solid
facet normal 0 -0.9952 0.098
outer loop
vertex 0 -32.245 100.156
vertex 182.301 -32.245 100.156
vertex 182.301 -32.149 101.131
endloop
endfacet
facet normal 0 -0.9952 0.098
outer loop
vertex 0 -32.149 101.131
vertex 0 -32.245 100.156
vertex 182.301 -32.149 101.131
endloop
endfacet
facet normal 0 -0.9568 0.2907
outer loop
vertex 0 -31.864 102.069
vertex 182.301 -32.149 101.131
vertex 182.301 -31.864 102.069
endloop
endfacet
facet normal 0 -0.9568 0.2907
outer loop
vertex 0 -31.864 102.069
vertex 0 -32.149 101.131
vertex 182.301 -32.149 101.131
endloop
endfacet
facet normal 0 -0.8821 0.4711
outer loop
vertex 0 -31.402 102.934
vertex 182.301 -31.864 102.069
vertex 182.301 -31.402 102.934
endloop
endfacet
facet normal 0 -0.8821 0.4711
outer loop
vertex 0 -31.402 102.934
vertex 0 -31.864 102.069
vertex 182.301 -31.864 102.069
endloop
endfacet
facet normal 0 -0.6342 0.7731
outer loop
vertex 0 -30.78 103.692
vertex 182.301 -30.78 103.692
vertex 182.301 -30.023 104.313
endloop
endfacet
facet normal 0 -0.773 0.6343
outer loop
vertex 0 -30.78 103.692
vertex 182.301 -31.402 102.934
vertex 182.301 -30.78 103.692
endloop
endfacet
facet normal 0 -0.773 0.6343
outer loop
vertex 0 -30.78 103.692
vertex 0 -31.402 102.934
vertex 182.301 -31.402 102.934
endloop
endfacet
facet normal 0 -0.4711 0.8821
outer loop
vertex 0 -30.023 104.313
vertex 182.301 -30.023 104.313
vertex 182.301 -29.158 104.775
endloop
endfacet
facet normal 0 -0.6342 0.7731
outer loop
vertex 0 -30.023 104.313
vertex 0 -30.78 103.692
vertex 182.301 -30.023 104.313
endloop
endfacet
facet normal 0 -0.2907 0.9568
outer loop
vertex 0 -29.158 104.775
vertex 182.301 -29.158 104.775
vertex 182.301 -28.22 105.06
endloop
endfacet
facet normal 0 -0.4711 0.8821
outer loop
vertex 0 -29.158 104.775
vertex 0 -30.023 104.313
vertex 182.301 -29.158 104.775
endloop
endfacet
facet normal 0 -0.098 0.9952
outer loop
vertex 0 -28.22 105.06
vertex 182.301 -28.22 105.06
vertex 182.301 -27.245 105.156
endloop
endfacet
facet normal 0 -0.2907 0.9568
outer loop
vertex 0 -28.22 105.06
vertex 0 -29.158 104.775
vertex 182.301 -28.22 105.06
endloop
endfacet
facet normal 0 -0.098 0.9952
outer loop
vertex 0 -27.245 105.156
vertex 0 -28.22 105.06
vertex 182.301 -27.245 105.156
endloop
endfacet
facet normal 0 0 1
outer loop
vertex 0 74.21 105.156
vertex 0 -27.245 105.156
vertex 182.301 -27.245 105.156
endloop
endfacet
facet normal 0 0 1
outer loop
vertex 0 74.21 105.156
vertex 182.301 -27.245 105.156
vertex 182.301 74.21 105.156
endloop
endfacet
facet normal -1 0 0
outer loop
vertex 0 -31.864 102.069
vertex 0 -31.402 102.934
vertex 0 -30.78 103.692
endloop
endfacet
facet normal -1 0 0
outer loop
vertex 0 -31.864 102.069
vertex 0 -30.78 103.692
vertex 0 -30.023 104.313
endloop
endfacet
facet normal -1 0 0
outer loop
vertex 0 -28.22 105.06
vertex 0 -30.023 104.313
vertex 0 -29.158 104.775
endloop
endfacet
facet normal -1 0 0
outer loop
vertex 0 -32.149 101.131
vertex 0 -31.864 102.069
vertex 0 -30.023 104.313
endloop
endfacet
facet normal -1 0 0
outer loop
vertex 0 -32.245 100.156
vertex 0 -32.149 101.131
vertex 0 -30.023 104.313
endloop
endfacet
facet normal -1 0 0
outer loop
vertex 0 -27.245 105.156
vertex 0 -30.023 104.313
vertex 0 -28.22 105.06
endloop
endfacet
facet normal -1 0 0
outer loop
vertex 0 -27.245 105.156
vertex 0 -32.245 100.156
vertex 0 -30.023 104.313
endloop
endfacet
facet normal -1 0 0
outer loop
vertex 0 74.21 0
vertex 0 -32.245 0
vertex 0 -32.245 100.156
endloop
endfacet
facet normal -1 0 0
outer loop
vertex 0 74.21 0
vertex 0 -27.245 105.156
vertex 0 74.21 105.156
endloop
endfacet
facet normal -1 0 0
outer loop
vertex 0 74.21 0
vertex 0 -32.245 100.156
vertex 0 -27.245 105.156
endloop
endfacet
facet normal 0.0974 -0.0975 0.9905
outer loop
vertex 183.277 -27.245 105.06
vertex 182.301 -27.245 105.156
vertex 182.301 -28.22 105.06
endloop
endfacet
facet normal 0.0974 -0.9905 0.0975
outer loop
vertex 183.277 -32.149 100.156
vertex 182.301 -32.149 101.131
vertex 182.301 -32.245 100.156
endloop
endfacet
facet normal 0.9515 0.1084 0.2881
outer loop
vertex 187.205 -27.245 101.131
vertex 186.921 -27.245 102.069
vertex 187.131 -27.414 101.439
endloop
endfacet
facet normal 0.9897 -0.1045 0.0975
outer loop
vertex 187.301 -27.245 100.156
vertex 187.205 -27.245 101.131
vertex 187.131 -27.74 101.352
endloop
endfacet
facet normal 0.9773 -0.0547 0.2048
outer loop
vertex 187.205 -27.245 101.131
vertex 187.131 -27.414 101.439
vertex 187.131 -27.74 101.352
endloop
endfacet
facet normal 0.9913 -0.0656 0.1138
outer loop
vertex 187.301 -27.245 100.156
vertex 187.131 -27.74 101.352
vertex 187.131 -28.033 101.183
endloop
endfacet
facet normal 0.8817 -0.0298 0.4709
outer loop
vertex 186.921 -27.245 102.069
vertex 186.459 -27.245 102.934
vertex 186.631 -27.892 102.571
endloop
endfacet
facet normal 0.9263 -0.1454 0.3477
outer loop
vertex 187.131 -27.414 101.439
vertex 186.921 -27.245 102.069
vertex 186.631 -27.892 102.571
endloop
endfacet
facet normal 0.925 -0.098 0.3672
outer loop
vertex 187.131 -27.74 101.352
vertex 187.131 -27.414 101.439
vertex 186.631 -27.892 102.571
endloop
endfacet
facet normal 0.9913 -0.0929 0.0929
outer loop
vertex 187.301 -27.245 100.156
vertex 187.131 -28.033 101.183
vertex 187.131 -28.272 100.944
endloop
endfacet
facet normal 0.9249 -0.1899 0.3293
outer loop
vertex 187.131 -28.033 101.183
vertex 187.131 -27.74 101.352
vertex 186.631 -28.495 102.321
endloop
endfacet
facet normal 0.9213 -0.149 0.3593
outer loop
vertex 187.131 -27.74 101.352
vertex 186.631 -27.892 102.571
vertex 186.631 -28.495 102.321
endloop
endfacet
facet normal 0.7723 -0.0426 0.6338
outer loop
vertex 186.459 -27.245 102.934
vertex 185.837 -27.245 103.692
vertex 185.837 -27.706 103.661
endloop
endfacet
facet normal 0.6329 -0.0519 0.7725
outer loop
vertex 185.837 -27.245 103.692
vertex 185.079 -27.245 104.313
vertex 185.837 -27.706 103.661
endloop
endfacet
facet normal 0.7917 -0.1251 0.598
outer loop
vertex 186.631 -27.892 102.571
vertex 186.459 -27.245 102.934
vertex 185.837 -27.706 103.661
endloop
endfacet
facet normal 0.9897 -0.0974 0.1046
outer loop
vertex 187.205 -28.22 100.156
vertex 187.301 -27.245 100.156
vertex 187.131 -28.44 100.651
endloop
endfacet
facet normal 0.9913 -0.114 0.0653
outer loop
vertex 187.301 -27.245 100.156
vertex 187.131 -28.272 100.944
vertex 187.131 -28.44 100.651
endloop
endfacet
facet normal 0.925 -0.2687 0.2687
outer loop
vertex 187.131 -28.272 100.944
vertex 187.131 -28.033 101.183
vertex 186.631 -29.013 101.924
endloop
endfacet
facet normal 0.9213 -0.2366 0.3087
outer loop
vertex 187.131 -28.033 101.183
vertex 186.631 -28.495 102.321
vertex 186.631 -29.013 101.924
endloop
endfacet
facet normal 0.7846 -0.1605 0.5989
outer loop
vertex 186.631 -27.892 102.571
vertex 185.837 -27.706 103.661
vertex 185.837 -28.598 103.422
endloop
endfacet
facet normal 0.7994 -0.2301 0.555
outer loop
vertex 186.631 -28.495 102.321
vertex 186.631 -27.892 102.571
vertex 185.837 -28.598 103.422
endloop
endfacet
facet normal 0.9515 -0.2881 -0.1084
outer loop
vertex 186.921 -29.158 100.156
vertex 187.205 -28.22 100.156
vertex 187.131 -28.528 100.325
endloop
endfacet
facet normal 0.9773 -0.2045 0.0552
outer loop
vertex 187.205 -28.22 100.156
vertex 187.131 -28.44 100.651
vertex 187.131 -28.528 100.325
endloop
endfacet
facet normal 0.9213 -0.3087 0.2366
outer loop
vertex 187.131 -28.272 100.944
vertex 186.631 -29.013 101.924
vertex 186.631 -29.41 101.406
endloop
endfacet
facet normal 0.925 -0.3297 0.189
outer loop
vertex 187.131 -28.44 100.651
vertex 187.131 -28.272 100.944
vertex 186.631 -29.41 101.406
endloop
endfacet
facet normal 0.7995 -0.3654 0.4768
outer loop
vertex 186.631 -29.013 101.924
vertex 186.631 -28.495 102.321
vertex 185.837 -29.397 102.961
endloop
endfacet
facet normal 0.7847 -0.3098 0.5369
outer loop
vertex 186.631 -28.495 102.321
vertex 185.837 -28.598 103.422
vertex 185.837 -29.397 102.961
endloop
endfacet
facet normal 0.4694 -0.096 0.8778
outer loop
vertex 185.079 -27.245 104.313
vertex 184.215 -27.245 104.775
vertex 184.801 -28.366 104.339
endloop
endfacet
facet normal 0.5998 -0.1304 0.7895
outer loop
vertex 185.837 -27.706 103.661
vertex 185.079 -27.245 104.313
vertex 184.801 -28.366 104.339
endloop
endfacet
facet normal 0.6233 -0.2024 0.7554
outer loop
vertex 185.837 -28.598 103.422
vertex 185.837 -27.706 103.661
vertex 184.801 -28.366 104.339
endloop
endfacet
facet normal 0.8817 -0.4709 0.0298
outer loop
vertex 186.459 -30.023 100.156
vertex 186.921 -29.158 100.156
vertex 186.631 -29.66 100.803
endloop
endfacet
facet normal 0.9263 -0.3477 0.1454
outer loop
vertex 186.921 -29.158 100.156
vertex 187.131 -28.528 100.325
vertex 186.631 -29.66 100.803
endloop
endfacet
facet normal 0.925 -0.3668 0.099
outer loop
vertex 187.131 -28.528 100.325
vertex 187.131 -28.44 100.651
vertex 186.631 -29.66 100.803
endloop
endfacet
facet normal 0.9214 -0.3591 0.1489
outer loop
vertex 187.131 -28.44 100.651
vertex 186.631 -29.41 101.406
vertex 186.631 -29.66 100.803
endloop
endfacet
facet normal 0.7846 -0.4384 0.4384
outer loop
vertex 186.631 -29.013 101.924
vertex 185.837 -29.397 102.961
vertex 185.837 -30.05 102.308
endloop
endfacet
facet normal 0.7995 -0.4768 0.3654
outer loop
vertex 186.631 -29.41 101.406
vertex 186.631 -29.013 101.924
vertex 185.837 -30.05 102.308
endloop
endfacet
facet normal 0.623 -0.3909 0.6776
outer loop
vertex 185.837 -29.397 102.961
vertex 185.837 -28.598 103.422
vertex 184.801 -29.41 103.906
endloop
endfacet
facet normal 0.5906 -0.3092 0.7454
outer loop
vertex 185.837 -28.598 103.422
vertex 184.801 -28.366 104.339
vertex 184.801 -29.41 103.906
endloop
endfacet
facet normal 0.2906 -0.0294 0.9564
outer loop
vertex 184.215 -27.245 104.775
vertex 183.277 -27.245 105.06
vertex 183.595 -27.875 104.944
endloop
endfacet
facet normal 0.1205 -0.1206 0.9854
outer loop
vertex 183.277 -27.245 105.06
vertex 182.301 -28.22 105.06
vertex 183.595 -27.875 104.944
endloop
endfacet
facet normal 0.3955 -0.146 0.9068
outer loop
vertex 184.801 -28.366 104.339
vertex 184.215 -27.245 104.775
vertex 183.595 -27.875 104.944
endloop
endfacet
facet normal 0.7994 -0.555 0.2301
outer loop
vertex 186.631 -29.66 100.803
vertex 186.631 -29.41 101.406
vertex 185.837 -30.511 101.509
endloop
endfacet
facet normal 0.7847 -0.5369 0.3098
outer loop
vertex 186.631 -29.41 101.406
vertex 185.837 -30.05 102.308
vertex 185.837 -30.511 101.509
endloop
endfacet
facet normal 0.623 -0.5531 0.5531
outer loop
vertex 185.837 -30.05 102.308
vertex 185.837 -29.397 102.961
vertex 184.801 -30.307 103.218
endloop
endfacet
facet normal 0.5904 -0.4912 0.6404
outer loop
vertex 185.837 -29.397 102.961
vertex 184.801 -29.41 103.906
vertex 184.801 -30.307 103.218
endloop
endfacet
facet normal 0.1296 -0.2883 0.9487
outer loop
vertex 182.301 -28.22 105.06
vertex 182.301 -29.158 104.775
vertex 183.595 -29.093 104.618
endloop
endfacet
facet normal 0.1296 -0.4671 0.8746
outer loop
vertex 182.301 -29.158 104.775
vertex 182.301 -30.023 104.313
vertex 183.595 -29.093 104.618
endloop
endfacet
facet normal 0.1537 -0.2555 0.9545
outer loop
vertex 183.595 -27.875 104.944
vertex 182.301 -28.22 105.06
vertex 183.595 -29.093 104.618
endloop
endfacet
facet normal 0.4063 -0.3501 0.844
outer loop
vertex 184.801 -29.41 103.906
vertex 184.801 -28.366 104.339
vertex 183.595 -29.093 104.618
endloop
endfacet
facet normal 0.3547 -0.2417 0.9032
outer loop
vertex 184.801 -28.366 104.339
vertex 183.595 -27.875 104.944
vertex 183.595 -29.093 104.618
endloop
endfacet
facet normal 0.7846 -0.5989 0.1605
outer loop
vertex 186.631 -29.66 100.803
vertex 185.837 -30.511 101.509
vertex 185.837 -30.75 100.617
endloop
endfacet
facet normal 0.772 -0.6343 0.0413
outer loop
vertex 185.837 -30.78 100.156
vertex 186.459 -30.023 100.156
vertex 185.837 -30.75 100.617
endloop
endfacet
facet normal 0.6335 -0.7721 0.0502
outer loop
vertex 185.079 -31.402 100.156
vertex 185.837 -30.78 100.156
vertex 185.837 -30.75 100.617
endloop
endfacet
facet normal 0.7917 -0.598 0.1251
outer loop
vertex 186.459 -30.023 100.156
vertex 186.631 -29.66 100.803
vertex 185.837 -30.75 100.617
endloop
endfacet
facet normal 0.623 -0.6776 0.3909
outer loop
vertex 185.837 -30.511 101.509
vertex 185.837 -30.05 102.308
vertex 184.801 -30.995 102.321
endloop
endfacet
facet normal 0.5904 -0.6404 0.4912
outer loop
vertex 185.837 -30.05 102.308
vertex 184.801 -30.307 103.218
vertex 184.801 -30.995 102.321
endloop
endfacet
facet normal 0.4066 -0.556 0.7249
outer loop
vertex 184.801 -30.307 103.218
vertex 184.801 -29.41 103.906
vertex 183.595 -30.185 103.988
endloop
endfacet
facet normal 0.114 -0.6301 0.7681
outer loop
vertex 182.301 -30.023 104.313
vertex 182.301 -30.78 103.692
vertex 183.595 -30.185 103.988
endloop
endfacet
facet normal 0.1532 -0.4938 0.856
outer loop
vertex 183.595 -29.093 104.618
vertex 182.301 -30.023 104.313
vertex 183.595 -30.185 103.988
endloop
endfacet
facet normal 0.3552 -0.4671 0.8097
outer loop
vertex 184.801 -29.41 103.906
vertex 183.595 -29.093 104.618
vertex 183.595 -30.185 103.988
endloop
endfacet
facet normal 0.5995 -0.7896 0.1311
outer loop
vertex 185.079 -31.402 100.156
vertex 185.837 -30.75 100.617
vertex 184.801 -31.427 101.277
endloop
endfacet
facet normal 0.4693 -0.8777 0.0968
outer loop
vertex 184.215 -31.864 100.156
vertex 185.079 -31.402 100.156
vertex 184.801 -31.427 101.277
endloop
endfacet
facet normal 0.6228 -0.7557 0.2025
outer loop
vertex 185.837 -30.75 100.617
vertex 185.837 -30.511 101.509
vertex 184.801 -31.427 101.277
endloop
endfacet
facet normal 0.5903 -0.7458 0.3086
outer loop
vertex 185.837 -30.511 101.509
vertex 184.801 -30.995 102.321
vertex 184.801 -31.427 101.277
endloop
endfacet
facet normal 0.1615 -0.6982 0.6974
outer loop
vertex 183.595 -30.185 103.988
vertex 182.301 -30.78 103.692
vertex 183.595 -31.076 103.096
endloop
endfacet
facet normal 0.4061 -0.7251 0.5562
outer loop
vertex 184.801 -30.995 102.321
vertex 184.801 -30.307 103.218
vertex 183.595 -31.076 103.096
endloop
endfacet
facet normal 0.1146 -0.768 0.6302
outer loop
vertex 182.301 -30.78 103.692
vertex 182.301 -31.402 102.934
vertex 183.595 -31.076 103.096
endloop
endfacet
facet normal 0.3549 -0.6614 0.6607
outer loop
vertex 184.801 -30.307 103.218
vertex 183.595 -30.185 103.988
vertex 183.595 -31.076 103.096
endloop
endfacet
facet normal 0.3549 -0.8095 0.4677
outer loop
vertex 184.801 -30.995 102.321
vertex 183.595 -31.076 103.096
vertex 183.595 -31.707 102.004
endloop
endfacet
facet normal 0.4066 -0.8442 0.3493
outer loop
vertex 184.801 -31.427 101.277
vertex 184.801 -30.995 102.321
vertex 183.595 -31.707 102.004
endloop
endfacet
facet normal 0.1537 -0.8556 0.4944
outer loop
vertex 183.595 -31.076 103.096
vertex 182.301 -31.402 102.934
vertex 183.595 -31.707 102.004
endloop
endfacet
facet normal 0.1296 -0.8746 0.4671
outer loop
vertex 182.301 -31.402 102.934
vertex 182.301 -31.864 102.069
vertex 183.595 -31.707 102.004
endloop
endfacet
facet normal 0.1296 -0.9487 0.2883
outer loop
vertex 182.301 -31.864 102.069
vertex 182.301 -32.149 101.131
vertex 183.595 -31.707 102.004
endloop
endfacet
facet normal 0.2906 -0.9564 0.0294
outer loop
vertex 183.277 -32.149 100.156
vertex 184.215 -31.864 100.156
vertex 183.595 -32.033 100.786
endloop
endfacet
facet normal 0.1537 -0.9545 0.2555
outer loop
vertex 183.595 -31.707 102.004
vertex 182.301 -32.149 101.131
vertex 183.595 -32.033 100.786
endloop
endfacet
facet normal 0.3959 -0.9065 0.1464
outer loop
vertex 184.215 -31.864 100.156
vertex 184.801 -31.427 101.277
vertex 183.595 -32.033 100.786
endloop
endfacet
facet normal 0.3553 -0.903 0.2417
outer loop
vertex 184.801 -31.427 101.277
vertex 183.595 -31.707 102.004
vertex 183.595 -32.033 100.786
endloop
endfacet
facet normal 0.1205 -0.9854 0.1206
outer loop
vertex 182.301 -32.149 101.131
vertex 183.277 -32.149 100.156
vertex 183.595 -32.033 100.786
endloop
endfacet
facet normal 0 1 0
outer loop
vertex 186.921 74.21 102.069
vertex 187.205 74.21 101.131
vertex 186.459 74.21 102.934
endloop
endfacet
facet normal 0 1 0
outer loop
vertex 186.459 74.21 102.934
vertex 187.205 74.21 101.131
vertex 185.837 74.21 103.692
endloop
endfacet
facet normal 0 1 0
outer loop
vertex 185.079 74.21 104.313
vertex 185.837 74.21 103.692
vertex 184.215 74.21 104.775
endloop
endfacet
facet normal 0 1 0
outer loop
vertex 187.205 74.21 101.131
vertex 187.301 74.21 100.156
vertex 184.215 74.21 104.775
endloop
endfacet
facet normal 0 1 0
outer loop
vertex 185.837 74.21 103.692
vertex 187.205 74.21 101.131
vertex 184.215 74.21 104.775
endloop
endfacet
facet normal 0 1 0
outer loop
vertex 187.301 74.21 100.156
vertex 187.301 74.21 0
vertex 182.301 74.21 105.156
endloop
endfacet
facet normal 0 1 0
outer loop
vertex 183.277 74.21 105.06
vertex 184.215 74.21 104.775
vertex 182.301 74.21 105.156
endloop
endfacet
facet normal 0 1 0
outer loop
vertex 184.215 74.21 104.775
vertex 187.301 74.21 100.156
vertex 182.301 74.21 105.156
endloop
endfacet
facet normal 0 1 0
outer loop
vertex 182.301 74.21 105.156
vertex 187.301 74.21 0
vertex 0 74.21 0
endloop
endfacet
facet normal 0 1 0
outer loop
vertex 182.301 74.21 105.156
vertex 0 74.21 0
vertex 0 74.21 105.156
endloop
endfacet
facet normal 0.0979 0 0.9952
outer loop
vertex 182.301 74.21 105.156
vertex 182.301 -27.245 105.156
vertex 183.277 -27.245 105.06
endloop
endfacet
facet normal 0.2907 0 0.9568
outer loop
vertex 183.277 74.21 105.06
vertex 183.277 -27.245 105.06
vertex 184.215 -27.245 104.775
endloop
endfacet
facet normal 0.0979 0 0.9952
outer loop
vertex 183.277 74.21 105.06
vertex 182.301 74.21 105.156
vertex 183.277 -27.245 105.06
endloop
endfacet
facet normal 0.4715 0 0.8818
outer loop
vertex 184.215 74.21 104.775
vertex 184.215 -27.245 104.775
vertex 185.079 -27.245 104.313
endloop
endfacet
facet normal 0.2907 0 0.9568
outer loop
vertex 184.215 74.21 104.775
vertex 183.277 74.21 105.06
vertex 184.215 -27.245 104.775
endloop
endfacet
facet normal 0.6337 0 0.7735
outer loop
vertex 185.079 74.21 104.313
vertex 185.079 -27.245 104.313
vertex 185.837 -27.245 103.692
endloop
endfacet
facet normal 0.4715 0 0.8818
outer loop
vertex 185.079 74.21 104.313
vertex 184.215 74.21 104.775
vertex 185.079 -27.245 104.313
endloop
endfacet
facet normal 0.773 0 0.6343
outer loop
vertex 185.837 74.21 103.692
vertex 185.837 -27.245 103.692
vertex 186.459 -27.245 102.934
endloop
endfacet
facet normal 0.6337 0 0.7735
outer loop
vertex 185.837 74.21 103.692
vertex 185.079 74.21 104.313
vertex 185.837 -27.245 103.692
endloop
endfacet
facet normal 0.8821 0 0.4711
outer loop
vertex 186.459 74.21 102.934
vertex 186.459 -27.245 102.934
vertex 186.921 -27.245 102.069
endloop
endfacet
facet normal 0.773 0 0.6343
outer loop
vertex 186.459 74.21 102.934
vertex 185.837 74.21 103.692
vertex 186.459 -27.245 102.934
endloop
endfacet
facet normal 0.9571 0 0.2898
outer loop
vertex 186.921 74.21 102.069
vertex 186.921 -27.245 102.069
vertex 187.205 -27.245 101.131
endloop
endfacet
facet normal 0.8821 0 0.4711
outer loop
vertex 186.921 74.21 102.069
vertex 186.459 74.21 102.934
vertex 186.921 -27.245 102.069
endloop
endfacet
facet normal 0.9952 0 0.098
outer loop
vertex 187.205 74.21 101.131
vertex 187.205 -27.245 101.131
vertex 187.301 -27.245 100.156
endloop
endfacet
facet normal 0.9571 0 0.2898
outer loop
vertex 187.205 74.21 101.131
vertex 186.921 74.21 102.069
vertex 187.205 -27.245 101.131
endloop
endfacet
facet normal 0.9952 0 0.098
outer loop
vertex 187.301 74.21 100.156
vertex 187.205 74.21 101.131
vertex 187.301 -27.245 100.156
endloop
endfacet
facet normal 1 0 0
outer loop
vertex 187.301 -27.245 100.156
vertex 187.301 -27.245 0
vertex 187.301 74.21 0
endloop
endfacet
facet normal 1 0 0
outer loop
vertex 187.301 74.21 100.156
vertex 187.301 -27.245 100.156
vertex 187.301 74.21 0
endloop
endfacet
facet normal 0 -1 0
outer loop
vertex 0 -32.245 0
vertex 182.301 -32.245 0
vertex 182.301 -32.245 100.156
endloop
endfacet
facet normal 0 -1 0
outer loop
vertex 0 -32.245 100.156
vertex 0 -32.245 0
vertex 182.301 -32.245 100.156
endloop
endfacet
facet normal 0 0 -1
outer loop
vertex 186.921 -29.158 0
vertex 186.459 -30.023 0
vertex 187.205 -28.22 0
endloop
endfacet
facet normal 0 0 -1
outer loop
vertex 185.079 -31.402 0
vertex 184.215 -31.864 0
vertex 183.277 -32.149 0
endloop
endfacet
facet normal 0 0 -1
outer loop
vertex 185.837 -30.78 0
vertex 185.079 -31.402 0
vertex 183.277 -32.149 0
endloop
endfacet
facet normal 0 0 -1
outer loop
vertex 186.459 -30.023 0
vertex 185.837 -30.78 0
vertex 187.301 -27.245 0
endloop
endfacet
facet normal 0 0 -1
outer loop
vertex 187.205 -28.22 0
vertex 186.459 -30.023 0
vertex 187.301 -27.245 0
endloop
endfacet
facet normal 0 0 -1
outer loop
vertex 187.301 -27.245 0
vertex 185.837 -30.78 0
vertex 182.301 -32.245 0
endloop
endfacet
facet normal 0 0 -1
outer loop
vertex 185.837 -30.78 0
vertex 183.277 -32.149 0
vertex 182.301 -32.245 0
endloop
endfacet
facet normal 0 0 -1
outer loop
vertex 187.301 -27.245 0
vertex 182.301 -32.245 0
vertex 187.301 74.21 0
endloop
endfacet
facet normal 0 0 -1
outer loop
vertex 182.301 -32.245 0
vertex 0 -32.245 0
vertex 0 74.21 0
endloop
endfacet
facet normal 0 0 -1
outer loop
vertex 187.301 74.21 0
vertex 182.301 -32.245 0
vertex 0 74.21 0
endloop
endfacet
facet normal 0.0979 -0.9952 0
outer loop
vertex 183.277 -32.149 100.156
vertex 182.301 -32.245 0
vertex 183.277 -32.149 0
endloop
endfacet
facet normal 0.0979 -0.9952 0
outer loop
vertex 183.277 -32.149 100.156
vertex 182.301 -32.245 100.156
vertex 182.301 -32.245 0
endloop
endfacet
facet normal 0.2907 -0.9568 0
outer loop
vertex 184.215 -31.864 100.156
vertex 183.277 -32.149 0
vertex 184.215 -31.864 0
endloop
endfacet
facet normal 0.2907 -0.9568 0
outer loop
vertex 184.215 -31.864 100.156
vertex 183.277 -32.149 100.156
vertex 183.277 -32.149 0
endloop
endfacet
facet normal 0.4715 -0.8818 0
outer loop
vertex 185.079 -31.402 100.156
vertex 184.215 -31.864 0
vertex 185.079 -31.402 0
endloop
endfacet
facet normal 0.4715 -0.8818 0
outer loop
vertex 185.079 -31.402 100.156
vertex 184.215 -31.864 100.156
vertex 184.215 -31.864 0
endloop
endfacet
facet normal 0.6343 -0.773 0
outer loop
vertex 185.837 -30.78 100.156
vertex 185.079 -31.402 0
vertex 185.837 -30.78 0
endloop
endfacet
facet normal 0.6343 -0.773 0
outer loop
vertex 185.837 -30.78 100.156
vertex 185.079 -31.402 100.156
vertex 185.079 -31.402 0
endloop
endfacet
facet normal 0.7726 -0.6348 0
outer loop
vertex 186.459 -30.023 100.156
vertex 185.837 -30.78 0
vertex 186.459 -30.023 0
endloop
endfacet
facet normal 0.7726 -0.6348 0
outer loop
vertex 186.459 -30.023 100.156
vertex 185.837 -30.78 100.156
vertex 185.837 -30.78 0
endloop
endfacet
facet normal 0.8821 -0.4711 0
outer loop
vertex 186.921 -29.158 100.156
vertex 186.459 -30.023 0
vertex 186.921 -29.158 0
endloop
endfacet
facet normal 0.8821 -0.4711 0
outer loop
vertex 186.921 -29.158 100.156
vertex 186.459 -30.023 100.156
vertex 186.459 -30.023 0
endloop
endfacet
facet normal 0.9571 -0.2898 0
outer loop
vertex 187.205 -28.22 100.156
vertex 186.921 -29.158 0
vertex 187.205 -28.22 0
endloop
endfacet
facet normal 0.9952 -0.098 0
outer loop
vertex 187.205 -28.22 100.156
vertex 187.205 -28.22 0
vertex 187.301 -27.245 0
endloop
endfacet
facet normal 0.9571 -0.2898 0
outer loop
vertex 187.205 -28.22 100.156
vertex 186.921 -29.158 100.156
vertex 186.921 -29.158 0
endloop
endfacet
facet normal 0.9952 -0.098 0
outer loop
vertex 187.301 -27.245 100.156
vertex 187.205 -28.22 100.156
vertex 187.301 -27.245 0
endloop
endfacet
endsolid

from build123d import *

# Parameters (mm, degrees)
F0_W     = 137.3012214899
F0_H     = 106.4546853304
F1_DEPTH = 105.156
F2_DEPTH = 50
F3_R     = 5


with BuildPart() as f1:
    # F0 (on Top) → F1 (new body)
    with BuildSketch(Plane.XY):
        with Locations((68.650610745, 20.9824740887)):
            Rectangle(F0_W, F0_H)
    extrude(amount=F1_DEPTH)

    # F2 (add): a face of the model
    f2_faces = [f1.faces().sort_by_distance(p)[0] for p in [
        (137.3012214899, 20.9824740887, 52.578),
    ]]
    extrude(f2_faces, amount=F2_DEPTH)

    # F3
    f3_edges = [f1.edges().sort_by_distance(p)[0] for p in [
        (93.650611, -32.244869, 105.156),
        (187.301221, 20.982474, 105.156),
        (187.301221, -32.244869, 52.578),
    ]]
    fillet(f3_edges, radius=F3_R)


solid = f1.part
